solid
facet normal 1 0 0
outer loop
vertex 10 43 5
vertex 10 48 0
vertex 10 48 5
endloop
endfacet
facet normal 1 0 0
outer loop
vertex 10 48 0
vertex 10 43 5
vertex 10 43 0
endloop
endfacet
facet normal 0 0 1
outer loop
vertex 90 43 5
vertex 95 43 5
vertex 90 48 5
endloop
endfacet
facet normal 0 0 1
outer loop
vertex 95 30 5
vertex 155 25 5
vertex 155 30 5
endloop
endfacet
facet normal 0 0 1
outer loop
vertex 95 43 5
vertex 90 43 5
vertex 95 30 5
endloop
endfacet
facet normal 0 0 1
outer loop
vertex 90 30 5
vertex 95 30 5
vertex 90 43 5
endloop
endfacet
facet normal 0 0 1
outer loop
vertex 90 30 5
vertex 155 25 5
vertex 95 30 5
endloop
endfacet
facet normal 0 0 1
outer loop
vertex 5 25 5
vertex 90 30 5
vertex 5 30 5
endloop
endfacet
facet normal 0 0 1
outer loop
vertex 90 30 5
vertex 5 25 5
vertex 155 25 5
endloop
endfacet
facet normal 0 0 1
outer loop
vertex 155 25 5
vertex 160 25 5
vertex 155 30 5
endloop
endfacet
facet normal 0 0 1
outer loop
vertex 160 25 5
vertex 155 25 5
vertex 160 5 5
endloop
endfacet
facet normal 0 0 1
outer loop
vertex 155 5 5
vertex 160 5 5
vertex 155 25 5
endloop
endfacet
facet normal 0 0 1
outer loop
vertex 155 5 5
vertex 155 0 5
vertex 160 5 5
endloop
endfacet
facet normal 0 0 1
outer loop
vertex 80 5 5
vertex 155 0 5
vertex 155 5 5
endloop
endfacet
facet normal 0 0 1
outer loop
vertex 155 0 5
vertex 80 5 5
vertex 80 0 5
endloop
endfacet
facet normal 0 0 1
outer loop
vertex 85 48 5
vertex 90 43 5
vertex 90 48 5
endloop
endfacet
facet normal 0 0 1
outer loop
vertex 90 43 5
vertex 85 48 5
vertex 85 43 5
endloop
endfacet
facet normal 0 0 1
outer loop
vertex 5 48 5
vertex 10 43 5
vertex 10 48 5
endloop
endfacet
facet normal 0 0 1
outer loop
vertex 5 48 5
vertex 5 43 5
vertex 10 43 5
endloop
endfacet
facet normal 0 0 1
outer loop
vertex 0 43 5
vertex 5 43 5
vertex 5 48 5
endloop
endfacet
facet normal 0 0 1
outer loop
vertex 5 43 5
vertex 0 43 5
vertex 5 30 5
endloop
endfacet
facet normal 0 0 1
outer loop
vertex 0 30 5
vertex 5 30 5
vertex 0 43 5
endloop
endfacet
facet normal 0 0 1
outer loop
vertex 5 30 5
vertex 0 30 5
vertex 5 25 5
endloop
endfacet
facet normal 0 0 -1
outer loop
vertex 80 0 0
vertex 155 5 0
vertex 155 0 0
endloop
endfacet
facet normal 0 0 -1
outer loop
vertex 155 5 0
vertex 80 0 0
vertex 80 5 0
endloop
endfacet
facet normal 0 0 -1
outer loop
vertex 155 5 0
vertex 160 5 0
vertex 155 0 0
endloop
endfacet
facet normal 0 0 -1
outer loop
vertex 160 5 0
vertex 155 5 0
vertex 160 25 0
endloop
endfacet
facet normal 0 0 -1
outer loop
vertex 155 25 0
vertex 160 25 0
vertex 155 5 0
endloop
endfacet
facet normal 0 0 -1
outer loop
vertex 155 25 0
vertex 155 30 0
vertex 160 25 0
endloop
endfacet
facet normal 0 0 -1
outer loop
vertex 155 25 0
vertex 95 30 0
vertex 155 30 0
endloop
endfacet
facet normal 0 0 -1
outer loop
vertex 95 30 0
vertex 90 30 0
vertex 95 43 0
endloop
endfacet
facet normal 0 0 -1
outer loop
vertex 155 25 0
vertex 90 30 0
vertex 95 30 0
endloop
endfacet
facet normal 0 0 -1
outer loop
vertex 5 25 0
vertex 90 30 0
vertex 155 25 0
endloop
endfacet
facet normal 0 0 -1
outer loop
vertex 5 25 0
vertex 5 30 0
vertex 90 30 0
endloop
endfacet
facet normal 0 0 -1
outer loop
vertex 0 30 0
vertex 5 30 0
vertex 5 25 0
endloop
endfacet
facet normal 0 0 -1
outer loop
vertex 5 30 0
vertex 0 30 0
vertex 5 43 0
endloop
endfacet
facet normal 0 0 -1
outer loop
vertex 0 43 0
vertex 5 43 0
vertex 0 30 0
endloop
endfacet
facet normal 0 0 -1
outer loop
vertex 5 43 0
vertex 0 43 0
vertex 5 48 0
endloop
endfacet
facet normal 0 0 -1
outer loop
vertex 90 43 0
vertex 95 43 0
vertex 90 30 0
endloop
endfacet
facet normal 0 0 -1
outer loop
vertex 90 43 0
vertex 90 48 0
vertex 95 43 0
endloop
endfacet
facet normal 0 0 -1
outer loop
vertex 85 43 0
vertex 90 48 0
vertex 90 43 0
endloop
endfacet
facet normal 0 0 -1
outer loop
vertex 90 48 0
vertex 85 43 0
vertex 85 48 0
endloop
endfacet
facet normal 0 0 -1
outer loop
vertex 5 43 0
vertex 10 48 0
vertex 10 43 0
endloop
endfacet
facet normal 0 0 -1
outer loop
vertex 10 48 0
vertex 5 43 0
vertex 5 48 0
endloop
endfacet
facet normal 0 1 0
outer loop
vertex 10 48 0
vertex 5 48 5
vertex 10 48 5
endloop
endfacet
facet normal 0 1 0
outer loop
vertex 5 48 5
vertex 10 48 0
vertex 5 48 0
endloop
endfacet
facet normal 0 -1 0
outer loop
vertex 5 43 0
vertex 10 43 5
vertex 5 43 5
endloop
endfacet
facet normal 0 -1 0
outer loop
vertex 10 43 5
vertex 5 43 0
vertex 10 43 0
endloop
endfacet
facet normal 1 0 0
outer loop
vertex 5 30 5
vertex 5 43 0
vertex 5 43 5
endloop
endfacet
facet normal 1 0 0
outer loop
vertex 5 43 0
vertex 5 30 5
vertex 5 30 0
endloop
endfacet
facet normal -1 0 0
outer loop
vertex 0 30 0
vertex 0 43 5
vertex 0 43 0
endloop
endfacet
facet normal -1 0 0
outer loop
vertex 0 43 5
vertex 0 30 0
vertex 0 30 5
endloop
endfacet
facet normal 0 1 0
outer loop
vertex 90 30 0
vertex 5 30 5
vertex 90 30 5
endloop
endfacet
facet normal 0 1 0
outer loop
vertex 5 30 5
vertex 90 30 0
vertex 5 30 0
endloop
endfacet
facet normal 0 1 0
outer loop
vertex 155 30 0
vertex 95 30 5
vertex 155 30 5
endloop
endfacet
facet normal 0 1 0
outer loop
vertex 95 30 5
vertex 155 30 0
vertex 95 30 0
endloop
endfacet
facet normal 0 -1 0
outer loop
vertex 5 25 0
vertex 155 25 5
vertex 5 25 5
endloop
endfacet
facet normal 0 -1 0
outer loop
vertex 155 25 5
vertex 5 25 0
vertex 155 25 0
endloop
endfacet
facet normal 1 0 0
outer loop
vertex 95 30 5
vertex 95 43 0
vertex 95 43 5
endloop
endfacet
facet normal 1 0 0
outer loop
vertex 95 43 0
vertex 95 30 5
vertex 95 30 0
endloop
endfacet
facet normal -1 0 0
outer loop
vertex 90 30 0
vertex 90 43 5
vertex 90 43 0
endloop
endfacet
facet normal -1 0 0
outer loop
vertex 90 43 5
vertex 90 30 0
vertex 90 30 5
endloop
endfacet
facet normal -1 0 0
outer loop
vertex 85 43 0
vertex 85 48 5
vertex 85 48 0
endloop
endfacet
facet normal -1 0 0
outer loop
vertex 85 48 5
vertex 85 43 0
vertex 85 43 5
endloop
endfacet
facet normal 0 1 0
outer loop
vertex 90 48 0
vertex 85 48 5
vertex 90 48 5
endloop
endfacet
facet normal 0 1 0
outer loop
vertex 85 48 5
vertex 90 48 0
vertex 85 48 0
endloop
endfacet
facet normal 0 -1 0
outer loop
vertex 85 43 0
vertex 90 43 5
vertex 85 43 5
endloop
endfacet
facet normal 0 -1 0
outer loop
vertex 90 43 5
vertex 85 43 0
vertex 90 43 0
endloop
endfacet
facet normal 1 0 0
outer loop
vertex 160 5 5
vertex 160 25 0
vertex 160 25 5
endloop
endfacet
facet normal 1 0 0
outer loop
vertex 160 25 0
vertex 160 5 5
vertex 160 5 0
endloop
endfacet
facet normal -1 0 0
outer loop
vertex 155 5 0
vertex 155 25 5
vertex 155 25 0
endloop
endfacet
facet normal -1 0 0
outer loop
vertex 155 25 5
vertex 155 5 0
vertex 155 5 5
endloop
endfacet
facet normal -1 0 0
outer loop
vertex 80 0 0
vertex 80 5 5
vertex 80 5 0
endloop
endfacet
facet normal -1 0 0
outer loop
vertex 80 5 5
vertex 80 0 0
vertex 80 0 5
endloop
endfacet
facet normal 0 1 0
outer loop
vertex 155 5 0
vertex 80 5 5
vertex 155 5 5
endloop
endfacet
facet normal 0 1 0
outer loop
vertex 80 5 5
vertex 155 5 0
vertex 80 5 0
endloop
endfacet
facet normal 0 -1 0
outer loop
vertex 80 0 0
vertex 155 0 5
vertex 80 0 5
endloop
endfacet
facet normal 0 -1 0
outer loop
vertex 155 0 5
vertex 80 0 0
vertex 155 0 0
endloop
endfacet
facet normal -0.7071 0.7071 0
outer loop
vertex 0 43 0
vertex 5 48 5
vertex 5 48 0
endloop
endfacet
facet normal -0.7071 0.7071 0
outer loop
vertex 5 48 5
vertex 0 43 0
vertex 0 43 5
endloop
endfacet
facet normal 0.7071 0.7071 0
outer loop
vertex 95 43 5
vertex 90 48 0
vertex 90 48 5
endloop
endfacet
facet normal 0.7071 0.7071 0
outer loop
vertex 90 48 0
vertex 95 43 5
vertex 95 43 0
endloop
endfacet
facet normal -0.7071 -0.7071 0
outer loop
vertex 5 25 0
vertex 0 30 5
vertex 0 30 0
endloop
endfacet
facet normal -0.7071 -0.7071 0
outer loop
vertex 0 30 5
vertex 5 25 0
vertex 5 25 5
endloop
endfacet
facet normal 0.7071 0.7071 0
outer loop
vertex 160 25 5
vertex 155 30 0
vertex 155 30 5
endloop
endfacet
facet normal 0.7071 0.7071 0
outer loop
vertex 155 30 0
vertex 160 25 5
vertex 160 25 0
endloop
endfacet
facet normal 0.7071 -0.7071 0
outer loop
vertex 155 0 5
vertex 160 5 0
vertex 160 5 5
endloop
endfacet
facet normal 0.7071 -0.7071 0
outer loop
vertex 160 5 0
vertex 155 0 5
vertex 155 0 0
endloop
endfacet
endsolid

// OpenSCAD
// Device Width
device_width = 85; // [1:200]
// Device Thickness
device_thickness = 13; // [1:50]
// Visor Thickness
visor_thickness = 20; // [1:50]
// Visor Height
visor_height = 150; // [1:300]
// Thickness
thickness = 5; // [1:10]

// device holder
translate([thickness, thickness+device_thickness+visor_thickness+thickness, 0])
	cube([thickness, thickness, thickness]);
translate([0, thickness+visor_thickness+thickness, 0])
	cube([thickness, device_thickness, thickness]);
translate([thickness, visor_thickness+thickness, 0])
	cube([device_width, thickness, thickness]);
translate([thickness+device_width, thickness+visor_thickness+thickness, 0])
	cube([thickness, device_thickness, thickness]);
translate([device_width, thickness+device_thickness+visor_thickness+thickness, 0])
	cube([thickness, thickness, thickness]);

// visor clip
translate([thickness, visor_thickness+thickness, 0])
	cube([visor_height, thickness, thickness]);
translate([thickness+visor_height, thickness, 0])
	cube([thickness, visor_thickness, thickness]);
translate([thickness+(visor_height/2), 0, 0])
	cube([visor_height/2, thickness, thickness]);

linear_extrude(thickness) {	
	polygon(points=[
		[0,         thickness+visor_thickness+thickness], 
		[thickness, thickness+visor_thickness+thickness], 
		[thickness, thickness+visor_thickness]], paths=[[0, 1, 2]]);
	polygon(points=[
		[0,         thickness+visor_thickness+thickness+device_thickness], 
		[thickness, thickness+visor_thickness+thickness+device_thickness+thickness], 
		[thickness, thickness+visor_thickness+thickness+device_thickness]], paths=[[0, 1, 2]]);
	polygon(points=[
		[thickness+visor_height,           0], 
		[thickness+visor_height,           thickness], 
		[thickness+visor_height+thickness, thickness]], paths=[[0, 1, 2]]);
	polygon(points=[
		[thickness+visor_height,           thickness+visor_thickness], 
		[thickness+visor_height,           thickness+visor_thickness+thickness], 
		[thickness+visor_height+thickness, thickness+visor_thickness]], paths=[[0, 1, 2]]);
	polygon(points=[
		[thickness+device_width,           thickness+visor_thickness], 
		[thickness+device_width,           thickness+visor_thickness+thickness], 
		[thickness+device_width+thickness, thickness+visor_thickness+thickness]], paths=[[0, 1, 2]]);
	polygon(points=[
		[thickness+device_width,           thickness+visor_thickness+thickness+device_thickness], 
		[thickness+device_width,           thickness+visor_thickness+thickness+device_thickness+thickness], 
		[thickness+device_width+thickness, thickness+visor_thickness+thickness+device_thickness]], paths=[[0, 1, 2]]);
}
